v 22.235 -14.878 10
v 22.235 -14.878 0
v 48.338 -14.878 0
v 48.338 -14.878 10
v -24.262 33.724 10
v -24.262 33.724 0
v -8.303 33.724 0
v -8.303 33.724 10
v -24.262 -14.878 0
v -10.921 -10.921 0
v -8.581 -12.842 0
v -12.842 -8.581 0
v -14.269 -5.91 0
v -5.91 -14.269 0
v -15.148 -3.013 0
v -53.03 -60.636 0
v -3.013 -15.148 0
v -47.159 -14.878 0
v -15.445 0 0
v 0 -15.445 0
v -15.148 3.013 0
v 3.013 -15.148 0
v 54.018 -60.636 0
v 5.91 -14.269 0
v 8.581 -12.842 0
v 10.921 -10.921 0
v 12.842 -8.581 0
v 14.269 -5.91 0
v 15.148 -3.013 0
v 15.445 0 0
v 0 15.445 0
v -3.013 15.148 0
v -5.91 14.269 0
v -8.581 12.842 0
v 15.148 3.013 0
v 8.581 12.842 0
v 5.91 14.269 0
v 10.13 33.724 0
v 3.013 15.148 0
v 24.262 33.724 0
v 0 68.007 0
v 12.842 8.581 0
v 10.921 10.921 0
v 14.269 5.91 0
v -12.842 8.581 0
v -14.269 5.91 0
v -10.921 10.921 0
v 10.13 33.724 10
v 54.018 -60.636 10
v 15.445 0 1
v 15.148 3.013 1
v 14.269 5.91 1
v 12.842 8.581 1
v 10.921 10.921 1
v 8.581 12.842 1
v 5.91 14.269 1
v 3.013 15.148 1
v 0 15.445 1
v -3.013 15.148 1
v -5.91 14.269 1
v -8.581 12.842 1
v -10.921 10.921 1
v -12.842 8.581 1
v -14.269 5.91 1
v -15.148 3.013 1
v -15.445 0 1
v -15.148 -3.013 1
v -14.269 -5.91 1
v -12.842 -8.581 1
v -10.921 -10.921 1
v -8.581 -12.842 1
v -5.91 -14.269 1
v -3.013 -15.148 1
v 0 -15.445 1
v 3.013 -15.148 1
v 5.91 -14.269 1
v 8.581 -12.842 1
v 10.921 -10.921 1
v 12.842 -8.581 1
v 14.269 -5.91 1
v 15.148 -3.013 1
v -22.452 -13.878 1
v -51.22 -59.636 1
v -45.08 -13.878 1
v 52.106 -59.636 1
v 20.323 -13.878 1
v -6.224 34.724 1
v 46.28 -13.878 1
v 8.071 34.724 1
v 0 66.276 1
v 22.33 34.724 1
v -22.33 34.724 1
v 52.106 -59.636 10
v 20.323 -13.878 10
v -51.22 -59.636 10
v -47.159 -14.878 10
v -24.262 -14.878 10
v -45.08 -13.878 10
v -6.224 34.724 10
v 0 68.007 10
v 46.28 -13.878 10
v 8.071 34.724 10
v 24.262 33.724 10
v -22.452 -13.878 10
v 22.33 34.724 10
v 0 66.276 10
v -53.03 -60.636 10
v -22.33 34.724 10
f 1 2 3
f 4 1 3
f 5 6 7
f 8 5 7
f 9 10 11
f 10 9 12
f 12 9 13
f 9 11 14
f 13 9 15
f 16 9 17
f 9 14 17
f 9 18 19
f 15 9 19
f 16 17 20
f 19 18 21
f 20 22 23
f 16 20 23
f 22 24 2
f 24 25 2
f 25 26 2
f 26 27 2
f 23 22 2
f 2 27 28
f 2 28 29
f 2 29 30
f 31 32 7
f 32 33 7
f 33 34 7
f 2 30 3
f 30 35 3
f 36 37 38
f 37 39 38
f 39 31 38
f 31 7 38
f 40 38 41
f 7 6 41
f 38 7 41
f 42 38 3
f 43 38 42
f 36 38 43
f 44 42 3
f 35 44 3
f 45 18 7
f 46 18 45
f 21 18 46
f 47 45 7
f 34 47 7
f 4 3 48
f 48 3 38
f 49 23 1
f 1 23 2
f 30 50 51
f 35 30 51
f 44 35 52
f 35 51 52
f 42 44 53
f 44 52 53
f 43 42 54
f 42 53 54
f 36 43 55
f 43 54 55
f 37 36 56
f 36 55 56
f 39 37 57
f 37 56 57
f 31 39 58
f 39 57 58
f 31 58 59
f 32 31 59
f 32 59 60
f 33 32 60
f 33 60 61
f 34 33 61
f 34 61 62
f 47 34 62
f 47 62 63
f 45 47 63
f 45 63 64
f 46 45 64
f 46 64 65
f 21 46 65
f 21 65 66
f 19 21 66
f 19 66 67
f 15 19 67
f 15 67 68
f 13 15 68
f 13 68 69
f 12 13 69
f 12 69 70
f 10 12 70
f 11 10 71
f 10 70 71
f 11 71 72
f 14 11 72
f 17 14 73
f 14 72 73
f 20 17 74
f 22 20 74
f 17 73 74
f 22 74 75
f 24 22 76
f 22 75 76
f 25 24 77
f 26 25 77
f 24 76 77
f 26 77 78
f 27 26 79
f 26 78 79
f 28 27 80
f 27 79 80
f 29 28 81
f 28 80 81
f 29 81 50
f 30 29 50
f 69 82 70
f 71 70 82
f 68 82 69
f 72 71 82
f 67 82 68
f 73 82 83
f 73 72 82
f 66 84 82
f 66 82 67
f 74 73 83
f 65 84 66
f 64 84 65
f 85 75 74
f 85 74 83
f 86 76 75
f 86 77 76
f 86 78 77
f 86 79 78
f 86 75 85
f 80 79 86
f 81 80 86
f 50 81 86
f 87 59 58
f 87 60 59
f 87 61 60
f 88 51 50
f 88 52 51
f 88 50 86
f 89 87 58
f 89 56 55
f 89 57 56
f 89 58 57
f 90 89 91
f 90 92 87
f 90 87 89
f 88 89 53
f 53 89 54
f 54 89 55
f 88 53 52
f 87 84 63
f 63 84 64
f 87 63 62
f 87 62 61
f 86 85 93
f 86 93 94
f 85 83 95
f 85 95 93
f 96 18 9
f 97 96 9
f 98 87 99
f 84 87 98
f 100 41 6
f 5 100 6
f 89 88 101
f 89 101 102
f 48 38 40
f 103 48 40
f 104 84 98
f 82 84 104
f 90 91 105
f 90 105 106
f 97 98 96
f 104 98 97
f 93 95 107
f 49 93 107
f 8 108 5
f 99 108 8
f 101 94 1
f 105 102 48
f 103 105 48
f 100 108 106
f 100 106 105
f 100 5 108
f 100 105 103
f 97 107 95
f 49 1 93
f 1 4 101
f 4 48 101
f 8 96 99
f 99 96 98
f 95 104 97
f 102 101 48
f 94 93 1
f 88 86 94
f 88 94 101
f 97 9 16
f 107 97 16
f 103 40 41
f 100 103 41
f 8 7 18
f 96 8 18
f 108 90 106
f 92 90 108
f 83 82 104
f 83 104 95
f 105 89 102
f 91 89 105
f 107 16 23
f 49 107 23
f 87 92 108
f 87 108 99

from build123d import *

# Parameters (mm, degrees)
F1_DEPTH = 10
F2_T     = -1
F3_R     = 15.4445915984
F4_DEPTH = 25


with BuildPart() as f1:
    # F0 (on Top) → F1 (new body)
    with BuildSketch(Plane.XY):
        Polygon((-24.2622910139, -14.8777581411), (-53.029731502, -60.6361962855), (54.0178157389, -60.6361962855), (22.2354376062, -14.8777581411), (48.3378368161, -14.8777581411), (10.1295774803, 33.7235331535), (24.2622910139, 33.7235331535), (0, 68.0067832147), (-24.2622910139, 33.7235331535), (-8.3033312269, 33.7235331535), (-47.1593588355, -14.8777581411), align=None)
    extrude(amount=F1_DEPTH)

    # F2
    f2_openings = [f1.faces().sort_by_distance(p)[0] for p in [
        (0.198833, -13.317224, 10),
    ]]
    offset(amount=F2_T, openings=f2_openings, kind=Kind.INTERSECTION)

    # F3 (on face) → F4 (cut)
    with BuildSketch(Plane.XY.offset(1)):
        Circle(F3_R)
    extrude(amount=-F4_DEPTH, mode=Mode.SUBTRACT)


solid = f1.part
